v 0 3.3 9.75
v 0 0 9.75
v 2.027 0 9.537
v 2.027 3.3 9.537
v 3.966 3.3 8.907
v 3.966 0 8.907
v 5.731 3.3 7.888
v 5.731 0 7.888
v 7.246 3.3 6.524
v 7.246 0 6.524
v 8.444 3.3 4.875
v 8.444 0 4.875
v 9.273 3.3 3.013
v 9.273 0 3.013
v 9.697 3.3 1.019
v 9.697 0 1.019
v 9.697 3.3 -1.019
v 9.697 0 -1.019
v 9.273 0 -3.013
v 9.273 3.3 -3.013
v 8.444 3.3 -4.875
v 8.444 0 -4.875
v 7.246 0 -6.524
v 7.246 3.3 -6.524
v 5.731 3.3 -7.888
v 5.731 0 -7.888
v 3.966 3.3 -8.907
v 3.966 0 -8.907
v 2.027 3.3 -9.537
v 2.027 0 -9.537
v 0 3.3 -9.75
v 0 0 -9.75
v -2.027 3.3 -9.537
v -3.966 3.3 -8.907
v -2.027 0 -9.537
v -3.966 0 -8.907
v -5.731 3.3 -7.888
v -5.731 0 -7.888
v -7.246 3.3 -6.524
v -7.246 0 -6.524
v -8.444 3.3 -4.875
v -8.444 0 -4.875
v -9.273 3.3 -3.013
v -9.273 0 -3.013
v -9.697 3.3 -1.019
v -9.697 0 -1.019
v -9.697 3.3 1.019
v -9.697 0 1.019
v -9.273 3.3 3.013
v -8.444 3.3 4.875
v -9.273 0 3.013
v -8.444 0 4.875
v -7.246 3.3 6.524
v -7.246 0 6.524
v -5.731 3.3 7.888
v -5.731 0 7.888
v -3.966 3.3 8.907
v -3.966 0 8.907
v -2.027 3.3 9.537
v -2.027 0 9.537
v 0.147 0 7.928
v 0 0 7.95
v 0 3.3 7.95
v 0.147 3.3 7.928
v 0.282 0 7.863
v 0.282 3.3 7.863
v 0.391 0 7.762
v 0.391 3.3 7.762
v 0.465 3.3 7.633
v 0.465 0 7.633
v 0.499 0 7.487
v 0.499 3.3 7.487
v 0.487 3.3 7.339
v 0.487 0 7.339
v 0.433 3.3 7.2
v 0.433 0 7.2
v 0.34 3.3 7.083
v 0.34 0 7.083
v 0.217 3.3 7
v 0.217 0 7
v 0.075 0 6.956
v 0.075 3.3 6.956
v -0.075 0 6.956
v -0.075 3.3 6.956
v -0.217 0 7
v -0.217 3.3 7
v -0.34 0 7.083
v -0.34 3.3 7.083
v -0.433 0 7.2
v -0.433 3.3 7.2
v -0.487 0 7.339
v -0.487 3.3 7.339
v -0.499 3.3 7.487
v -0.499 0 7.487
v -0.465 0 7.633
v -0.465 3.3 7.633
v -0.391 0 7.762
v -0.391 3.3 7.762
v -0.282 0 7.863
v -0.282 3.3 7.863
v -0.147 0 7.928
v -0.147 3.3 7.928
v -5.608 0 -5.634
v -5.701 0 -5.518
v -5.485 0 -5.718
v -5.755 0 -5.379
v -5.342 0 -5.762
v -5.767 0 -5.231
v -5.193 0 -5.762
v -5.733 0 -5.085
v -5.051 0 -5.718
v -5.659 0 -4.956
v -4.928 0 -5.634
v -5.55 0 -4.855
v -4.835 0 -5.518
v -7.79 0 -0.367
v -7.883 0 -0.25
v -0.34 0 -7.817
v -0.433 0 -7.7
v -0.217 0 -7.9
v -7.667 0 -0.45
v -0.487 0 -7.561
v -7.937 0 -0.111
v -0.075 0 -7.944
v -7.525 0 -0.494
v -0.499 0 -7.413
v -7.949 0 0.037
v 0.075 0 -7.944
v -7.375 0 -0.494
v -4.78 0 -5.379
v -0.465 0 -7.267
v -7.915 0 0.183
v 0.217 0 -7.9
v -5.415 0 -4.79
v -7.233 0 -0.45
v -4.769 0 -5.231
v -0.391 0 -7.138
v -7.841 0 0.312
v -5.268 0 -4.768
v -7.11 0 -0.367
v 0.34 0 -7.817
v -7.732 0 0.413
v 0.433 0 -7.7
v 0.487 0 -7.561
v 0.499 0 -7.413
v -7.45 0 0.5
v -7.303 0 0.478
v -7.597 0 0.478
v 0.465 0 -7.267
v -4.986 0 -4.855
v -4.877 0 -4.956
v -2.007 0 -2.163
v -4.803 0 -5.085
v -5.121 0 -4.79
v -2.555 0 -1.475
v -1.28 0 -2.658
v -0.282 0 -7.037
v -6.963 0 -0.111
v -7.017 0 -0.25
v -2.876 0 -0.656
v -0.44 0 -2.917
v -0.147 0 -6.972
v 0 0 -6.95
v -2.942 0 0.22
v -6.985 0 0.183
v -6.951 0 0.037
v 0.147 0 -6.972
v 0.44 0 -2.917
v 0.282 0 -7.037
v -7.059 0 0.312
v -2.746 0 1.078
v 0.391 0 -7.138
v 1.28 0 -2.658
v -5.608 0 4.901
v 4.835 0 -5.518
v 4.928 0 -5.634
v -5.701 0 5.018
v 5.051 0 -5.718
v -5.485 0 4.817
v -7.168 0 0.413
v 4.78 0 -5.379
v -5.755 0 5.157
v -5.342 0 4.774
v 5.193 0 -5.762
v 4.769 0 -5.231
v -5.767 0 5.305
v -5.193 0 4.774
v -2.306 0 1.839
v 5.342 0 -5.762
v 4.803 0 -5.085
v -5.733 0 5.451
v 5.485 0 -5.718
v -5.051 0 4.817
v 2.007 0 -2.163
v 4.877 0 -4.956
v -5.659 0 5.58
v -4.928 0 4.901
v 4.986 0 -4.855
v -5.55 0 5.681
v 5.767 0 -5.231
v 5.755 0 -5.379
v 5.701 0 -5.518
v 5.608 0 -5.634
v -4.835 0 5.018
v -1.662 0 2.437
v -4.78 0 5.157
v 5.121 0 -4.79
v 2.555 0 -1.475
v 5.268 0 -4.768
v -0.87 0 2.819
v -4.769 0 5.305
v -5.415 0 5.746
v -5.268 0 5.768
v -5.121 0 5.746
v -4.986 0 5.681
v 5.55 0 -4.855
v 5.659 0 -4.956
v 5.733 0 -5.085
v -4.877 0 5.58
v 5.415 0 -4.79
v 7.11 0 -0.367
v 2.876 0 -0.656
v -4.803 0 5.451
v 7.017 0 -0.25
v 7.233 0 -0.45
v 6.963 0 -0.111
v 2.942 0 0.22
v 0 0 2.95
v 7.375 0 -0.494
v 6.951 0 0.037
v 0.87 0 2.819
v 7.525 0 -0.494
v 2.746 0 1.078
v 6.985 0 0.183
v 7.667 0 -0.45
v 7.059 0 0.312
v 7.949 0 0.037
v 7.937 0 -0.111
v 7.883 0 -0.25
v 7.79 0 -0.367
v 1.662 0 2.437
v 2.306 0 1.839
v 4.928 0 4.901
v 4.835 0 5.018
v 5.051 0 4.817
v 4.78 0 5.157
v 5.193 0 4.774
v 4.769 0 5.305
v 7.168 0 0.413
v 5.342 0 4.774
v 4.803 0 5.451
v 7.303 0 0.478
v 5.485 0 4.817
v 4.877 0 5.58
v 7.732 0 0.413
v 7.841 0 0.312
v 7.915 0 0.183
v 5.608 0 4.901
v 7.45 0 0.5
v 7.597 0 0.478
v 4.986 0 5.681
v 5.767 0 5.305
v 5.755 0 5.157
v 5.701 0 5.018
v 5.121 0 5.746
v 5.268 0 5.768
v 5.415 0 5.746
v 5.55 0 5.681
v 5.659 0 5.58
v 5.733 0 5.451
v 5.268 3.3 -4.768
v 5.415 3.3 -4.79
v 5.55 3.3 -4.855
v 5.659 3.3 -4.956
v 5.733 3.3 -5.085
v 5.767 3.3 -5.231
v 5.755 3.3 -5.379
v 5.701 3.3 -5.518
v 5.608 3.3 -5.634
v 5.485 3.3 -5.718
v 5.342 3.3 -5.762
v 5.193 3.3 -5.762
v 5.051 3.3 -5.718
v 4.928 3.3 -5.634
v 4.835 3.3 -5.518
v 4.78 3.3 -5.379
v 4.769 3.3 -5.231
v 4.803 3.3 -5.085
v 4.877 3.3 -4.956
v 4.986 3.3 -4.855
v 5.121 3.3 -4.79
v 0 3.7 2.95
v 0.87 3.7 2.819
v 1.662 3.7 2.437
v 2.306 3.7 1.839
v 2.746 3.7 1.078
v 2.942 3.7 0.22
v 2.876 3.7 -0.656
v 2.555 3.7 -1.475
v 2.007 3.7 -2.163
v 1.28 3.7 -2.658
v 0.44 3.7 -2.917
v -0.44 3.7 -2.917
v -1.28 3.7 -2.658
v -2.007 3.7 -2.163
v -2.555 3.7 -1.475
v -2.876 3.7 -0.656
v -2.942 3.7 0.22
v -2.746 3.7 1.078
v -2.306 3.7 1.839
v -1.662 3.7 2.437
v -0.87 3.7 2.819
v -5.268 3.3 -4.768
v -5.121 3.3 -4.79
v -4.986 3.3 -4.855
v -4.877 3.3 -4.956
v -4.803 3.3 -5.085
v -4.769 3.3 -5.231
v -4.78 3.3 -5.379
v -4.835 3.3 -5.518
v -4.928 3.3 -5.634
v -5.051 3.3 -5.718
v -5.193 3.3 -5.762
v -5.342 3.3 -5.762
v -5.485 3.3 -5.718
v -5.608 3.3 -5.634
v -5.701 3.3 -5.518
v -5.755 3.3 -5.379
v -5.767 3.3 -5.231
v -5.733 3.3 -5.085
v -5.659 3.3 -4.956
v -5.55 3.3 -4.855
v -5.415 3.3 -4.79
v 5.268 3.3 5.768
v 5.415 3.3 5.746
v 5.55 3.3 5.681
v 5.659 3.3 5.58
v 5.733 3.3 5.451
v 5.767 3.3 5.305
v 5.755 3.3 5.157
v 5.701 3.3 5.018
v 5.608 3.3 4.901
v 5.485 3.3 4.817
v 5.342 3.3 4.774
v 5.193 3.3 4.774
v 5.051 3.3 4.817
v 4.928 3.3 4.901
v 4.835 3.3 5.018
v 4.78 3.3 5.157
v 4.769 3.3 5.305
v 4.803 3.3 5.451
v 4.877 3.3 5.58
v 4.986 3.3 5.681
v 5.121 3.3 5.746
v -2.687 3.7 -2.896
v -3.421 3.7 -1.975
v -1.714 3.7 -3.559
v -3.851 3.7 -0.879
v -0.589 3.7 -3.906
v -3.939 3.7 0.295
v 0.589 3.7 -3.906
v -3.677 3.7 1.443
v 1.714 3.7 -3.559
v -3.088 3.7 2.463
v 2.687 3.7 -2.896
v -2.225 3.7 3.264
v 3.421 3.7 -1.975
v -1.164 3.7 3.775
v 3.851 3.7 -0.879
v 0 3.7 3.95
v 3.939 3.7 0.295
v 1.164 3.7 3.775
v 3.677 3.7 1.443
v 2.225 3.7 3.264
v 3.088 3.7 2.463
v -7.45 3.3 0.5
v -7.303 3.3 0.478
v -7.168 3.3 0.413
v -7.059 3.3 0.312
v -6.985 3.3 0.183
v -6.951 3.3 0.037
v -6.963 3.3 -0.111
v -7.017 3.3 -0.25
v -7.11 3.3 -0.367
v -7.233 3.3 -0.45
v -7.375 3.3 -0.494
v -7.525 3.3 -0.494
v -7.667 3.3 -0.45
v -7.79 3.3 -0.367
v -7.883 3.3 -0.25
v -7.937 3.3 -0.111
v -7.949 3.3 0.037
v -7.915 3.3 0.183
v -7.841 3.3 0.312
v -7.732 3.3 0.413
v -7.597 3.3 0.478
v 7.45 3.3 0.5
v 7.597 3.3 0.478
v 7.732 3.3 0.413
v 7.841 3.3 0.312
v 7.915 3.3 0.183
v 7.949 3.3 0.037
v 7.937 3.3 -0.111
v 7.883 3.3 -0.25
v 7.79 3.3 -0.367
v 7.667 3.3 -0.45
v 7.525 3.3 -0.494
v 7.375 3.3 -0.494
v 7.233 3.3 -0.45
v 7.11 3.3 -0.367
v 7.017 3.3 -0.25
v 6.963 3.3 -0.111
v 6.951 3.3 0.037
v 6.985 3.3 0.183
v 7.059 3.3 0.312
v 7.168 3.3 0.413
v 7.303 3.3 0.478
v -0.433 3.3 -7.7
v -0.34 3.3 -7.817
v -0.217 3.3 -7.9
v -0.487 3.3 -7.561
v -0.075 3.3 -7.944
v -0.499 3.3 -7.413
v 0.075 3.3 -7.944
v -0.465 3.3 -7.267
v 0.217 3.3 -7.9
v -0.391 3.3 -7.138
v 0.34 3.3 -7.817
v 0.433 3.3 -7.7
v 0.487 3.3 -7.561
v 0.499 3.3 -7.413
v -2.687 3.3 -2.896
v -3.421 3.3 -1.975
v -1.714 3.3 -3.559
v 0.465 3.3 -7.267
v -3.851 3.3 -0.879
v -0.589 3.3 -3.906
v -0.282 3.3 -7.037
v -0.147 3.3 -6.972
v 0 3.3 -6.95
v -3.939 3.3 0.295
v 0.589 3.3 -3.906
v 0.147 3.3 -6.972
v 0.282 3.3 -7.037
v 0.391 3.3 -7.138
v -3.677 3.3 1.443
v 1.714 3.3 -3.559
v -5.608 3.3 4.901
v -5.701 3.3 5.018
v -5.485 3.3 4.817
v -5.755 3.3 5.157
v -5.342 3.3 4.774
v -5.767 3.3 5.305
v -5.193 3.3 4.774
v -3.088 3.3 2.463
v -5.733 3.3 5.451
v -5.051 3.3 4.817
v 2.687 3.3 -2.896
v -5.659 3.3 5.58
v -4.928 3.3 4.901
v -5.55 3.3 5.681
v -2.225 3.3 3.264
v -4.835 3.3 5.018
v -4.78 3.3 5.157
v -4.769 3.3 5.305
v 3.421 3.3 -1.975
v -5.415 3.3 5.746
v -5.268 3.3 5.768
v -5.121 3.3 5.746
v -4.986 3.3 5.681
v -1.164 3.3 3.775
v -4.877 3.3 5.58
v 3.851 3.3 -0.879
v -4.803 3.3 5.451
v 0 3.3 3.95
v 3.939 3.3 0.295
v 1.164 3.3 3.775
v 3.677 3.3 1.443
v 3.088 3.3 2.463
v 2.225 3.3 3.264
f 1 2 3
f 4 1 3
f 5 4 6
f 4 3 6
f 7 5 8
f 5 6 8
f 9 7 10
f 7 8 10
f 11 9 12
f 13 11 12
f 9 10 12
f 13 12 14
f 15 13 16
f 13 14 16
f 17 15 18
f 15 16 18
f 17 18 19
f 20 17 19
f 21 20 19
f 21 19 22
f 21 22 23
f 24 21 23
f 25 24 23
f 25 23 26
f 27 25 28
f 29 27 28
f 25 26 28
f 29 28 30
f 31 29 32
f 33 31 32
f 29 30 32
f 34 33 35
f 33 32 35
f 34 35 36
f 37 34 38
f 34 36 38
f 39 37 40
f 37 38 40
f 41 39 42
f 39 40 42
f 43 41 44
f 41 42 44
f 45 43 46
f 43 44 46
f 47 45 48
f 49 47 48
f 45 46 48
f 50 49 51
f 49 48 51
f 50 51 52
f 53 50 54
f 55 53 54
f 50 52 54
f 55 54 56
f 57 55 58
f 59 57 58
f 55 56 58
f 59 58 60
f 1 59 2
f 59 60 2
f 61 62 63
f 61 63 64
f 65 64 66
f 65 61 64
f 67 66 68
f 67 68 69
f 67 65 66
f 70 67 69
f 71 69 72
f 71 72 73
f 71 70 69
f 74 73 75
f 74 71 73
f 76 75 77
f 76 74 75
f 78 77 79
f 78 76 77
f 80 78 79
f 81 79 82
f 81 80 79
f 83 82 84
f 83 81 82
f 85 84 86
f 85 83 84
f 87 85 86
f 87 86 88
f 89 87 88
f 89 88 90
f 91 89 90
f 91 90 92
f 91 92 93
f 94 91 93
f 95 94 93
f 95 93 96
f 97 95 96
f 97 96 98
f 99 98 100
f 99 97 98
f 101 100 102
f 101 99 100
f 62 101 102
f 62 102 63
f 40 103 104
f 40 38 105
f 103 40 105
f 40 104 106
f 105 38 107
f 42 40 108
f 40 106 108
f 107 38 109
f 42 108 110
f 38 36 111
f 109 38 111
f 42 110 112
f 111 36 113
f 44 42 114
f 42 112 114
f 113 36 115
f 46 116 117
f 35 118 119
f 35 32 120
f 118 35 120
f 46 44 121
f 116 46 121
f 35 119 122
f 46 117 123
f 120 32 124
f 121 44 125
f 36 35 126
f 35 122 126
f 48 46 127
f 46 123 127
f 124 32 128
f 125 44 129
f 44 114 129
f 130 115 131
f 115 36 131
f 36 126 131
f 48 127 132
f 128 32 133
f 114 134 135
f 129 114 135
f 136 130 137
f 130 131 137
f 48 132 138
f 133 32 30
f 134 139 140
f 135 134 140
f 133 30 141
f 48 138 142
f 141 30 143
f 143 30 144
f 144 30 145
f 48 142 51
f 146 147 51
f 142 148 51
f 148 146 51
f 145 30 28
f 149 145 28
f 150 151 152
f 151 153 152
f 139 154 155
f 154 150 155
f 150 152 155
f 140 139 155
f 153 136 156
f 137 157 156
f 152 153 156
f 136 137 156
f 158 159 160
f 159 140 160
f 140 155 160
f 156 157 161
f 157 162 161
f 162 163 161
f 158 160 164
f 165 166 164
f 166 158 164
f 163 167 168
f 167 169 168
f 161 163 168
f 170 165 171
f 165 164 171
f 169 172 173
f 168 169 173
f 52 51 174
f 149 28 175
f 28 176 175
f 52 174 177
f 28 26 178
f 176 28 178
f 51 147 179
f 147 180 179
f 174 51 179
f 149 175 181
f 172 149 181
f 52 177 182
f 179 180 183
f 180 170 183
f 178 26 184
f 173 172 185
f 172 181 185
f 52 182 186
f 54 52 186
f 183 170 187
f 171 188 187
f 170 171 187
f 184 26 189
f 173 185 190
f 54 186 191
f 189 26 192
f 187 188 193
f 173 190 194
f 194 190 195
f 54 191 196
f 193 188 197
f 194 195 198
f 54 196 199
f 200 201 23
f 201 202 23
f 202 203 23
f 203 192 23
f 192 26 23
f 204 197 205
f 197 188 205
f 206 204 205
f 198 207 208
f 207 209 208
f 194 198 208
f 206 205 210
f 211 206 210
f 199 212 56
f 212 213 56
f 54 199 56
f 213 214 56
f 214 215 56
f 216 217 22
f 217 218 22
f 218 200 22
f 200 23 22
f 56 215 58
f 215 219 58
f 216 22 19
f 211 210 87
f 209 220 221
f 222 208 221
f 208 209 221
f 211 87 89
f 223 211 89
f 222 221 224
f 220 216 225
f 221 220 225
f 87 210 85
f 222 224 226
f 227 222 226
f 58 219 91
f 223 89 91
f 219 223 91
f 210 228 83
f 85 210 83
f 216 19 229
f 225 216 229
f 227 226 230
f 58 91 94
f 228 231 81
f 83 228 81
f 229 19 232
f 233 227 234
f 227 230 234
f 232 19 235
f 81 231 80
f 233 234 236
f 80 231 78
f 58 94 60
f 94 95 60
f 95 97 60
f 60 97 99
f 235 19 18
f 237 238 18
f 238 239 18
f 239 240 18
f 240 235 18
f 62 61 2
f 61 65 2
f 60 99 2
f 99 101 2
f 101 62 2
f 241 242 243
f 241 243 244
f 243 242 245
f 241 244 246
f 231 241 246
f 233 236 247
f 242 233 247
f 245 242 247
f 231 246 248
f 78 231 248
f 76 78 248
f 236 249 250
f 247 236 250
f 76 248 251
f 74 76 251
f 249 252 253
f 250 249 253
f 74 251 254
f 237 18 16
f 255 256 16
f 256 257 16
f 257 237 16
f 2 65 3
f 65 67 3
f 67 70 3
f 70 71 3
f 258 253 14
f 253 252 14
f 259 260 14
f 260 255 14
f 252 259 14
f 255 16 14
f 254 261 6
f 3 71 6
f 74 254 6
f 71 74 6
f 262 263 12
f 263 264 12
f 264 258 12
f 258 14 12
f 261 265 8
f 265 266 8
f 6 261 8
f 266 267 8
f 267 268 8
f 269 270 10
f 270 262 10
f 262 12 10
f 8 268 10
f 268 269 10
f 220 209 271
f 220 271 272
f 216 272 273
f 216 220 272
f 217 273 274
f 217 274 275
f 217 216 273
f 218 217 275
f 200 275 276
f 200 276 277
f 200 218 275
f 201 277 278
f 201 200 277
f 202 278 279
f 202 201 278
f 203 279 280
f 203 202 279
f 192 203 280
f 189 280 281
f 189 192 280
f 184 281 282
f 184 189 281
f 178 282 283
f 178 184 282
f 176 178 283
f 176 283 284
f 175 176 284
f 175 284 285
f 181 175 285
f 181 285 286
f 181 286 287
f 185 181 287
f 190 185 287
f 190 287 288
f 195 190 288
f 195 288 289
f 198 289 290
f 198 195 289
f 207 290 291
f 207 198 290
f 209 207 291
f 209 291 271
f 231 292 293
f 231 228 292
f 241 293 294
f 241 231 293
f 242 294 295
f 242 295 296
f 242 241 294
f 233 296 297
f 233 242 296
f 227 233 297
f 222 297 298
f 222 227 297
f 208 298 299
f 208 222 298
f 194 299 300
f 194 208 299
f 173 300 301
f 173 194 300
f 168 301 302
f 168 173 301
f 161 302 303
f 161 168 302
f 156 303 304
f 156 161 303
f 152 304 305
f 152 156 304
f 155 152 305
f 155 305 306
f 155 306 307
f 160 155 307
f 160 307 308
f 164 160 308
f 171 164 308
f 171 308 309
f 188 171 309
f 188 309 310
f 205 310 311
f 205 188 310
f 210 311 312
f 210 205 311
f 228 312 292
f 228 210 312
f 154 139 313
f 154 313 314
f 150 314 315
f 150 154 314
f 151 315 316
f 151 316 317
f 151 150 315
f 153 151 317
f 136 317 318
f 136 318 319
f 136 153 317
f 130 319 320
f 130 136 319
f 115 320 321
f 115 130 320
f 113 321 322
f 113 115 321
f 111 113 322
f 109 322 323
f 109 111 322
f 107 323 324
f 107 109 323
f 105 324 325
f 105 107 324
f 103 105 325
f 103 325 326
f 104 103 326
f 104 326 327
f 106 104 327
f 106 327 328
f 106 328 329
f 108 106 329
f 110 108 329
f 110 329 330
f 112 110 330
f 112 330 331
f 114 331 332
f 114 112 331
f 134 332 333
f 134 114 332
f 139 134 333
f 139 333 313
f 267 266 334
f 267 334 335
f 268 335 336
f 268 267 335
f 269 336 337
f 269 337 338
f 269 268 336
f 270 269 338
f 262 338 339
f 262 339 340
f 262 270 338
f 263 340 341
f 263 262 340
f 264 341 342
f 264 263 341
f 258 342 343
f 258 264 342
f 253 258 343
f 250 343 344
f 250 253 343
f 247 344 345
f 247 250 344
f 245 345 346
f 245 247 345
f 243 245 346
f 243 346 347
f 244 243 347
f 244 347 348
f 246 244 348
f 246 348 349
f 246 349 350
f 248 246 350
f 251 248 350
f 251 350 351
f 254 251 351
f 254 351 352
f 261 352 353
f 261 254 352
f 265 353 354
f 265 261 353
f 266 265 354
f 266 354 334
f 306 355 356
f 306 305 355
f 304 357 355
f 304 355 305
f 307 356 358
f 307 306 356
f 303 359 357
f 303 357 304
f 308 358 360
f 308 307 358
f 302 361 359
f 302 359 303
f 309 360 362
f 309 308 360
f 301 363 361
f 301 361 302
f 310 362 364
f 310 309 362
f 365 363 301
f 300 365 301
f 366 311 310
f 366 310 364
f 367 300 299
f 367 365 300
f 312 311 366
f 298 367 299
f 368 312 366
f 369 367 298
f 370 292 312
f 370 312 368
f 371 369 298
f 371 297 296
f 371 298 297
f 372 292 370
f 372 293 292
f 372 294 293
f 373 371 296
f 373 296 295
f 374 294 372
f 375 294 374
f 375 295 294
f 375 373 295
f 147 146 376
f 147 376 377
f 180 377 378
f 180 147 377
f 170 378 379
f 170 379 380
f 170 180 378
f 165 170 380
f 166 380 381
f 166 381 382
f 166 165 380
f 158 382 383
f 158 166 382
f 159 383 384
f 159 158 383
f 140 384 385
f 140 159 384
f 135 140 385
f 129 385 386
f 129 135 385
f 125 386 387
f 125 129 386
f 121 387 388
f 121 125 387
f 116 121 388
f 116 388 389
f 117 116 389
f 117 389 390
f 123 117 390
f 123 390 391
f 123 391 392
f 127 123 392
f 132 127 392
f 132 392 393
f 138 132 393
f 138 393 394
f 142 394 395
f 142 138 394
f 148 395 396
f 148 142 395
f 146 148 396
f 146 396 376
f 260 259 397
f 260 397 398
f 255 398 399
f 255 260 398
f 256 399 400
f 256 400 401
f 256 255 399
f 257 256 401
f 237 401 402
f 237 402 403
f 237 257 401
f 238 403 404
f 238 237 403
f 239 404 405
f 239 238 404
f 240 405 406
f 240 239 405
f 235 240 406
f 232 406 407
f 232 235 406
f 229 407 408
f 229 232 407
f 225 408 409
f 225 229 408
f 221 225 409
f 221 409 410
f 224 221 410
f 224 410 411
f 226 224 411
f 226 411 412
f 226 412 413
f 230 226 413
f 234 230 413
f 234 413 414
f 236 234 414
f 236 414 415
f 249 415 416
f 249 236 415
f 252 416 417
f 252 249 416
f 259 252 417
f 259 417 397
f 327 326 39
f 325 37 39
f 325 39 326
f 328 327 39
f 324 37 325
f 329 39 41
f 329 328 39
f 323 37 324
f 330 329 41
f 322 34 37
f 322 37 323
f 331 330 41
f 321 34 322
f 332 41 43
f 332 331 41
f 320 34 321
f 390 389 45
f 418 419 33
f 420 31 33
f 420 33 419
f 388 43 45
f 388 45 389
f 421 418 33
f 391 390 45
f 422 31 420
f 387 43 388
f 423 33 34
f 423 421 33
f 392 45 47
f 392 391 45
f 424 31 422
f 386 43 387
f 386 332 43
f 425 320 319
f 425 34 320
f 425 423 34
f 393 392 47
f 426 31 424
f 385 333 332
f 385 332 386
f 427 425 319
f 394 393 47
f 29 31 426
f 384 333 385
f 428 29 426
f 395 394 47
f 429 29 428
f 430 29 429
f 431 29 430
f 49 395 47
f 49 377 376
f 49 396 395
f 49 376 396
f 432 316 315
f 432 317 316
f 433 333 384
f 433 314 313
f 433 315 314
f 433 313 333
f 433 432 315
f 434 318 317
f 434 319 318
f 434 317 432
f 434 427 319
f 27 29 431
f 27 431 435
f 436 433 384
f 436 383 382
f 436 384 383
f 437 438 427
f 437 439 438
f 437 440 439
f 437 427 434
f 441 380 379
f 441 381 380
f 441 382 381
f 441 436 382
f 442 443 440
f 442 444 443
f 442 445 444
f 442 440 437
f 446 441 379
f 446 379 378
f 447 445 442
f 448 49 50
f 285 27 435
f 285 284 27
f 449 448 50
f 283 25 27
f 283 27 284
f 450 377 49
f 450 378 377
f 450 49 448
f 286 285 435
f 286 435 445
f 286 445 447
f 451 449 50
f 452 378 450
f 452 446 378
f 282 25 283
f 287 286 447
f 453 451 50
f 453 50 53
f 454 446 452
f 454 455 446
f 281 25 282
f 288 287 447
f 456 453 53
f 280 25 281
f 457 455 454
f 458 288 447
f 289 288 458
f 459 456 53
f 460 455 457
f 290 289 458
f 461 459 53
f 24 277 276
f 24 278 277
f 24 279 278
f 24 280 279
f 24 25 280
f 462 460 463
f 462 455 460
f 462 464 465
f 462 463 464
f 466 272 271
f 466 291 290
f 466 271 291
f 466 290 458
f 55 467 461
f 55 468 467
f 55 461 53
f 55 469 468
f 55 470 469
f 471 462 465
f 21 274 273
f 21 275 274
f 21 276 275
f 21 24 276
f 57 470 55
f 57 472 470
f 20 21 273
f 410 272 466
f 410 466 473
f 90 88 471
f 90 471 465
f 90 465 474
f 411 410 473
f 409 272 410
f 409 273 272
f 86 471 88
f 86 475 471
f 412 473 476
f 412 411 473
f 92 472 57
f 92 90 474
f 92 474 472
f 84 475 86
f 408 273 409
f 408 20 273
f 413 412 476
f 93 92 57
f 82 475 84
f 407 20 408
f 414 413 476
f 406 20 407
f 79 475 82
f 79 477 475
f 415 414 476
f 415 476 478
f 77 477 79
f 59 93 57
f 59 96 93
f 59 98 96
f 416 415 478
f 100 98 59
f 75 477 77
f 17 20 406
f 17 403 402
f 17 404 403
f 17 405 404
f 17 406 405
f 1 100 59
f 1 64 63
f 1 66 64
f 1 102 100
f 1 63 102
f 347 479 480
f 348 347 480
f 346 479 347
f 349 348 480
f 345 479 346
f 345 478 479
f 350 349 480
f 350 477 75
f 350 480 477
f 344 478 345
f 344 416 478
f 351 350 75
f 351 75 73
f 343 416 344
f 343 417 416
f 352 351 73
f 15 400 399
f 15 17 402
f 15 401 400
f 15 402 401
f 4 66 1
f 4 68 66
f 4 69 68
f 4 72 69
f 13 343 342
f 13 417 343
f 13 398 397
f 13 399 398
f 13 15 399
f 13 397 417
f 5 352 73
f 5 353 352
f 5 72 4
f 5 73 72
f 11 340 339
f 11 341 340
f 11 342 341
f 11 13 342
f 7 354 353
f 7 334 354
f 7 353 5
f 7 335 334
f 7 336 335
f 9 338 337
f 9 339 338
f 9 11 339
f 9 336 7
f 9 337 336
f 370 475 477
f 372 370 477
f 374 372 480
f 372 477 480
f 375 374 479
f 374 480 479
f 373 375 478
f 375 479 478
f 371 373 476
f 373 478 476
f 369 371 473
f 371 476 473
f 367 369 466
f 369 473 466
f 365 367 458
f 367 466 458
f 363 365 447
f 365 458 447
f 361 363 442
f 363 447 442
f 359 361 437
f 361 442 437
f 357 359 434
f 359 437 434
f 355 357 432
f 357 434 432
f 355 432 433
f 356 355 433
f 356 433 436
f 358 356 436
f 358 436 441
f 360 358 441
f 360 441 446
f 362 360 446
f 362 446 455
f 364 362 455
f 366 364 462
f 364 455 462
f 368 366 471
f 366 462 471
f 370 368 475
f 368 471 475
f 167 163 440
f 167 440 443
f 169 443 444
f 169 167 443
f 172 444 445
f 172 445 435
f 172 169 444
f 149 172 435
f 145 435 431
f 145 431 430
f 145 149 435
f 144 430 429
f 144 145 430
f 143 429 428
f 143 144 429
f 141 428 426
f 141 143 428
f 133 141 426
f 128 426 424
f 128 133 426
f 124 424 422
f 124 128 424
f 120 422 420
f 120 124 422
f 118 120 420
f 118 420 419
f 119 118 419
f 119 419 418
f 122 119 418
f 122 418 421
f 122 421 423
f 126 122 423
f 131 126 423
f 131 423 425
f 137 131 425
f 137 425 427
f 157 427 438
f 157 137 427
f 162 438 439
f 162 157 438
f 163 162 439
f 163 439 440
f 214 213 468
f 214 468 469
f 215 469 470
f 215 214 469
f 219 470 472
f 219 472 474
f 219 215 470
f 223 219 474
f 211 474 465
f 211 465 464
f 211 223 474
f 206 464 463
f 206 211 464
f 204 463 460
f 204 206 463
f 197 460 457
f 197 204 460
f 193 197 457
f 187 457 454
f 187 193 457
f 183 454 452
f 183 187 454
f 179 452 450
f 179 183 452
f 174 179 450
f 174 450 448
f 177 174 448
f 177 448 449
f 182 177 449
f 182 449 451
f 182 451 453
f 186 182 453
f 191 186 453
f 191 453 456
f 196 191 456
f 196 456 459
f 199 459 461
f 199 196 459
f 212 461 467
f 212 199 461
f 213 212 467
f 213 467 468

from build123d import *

# Parameters (mm, degrees)
SKETCH1_R           = 9.75
SKETCH1_R_2         = 2.95
SKETCH1_R_3         = 0.5
BOSS_EXTRUDE1_DEPTH = 3.3
SKETCH2_R           = 3.95
SKETCH2_R_2         = 2.95
BOSS_EXTRUDE2_DEPTH = 0.4


with BuildPart() as part:
    # Sketch1 → Boss-Extrude1 (new body)
    with BuildSketch(Plane(origin=(0, 0, 0), x_dir=(1, 0, 0), z_dir=(0, 1, 0))):
        with Locations(Location((0, 0, 0), (0, 0, 270))):
            Circle(SKETCH1_R)
        with Locations(Location((0, 0, 0), (0, 0, 270))):
            Circle(SKETCH1_R_2, mode=Mode.SUBTRACT)
        with Locations(Location((0, 7.45, 0), (0, 0, 270))):
            Circle(SKETCH1_R_3, mode=Mode.SUBTRACT)
        with Locations(Location((5.26794552, 5.26794552, 0), (0, 0, 270))):
            Circle(SKETCH1_R_3, mode=Mode.SUBTRACT)
        with Locations(Location((7.45, 0, 0), (0, 0, 270))):
            Circle(SKETCH1_R_3, mode=Mode.SUBTRACT)
        with Locations(Location((5.26794552, -5.26794552, 0), (0, 0, 270))):
            Circle(SKETCH1_R_3, mode=Mode.SUBTRACT)
        with Locations(Location((0, -7.45, 0), (0, 0, 270))):
            Circle(SKETCH1_R_3, mode=Mode.SUBTRACT)
        with Locations(Location((-5.26794552, -5.26794552, 0), (0, 0, 270))):
            Circle(SKETCH1_R_3, mode=Mode.SUBTRACT)
        with Locations(Location((-7.45, 0, 0), (0, 0, 270))):
            Circle(SKETCH1_R_3, mode=Mode.SUBTRACT)
        with Locations(Location((-5.26794552, 5.26794552, 0), (0, 0, 270))):
            Circle(SKETCH1_R_3, mode=Mode.SUBTRACT)
    extrude(amount=BOSS_EXTRUDE1_DEPTH)

    # Sketch2 → Boss-Extrude2 (add)
    with BuildSketch(Plane(origin=(0, 3.3, 0), x_dir=(1, 0, 0), z_dir=(0, 1, 0))):
        with Locations(Location((0, 0, 0), (0, 0, 270))):
            Circle(SKETCH2_R)
        with Locations(Location((0, 0, 0), (0, 0, 270))):
            Circle(SKETCH2_R_2, mode=Mode.SUBTRACT)
    extrude(amount=BOSS_EXTRUDE2_DEPTH)


solid = part.part
